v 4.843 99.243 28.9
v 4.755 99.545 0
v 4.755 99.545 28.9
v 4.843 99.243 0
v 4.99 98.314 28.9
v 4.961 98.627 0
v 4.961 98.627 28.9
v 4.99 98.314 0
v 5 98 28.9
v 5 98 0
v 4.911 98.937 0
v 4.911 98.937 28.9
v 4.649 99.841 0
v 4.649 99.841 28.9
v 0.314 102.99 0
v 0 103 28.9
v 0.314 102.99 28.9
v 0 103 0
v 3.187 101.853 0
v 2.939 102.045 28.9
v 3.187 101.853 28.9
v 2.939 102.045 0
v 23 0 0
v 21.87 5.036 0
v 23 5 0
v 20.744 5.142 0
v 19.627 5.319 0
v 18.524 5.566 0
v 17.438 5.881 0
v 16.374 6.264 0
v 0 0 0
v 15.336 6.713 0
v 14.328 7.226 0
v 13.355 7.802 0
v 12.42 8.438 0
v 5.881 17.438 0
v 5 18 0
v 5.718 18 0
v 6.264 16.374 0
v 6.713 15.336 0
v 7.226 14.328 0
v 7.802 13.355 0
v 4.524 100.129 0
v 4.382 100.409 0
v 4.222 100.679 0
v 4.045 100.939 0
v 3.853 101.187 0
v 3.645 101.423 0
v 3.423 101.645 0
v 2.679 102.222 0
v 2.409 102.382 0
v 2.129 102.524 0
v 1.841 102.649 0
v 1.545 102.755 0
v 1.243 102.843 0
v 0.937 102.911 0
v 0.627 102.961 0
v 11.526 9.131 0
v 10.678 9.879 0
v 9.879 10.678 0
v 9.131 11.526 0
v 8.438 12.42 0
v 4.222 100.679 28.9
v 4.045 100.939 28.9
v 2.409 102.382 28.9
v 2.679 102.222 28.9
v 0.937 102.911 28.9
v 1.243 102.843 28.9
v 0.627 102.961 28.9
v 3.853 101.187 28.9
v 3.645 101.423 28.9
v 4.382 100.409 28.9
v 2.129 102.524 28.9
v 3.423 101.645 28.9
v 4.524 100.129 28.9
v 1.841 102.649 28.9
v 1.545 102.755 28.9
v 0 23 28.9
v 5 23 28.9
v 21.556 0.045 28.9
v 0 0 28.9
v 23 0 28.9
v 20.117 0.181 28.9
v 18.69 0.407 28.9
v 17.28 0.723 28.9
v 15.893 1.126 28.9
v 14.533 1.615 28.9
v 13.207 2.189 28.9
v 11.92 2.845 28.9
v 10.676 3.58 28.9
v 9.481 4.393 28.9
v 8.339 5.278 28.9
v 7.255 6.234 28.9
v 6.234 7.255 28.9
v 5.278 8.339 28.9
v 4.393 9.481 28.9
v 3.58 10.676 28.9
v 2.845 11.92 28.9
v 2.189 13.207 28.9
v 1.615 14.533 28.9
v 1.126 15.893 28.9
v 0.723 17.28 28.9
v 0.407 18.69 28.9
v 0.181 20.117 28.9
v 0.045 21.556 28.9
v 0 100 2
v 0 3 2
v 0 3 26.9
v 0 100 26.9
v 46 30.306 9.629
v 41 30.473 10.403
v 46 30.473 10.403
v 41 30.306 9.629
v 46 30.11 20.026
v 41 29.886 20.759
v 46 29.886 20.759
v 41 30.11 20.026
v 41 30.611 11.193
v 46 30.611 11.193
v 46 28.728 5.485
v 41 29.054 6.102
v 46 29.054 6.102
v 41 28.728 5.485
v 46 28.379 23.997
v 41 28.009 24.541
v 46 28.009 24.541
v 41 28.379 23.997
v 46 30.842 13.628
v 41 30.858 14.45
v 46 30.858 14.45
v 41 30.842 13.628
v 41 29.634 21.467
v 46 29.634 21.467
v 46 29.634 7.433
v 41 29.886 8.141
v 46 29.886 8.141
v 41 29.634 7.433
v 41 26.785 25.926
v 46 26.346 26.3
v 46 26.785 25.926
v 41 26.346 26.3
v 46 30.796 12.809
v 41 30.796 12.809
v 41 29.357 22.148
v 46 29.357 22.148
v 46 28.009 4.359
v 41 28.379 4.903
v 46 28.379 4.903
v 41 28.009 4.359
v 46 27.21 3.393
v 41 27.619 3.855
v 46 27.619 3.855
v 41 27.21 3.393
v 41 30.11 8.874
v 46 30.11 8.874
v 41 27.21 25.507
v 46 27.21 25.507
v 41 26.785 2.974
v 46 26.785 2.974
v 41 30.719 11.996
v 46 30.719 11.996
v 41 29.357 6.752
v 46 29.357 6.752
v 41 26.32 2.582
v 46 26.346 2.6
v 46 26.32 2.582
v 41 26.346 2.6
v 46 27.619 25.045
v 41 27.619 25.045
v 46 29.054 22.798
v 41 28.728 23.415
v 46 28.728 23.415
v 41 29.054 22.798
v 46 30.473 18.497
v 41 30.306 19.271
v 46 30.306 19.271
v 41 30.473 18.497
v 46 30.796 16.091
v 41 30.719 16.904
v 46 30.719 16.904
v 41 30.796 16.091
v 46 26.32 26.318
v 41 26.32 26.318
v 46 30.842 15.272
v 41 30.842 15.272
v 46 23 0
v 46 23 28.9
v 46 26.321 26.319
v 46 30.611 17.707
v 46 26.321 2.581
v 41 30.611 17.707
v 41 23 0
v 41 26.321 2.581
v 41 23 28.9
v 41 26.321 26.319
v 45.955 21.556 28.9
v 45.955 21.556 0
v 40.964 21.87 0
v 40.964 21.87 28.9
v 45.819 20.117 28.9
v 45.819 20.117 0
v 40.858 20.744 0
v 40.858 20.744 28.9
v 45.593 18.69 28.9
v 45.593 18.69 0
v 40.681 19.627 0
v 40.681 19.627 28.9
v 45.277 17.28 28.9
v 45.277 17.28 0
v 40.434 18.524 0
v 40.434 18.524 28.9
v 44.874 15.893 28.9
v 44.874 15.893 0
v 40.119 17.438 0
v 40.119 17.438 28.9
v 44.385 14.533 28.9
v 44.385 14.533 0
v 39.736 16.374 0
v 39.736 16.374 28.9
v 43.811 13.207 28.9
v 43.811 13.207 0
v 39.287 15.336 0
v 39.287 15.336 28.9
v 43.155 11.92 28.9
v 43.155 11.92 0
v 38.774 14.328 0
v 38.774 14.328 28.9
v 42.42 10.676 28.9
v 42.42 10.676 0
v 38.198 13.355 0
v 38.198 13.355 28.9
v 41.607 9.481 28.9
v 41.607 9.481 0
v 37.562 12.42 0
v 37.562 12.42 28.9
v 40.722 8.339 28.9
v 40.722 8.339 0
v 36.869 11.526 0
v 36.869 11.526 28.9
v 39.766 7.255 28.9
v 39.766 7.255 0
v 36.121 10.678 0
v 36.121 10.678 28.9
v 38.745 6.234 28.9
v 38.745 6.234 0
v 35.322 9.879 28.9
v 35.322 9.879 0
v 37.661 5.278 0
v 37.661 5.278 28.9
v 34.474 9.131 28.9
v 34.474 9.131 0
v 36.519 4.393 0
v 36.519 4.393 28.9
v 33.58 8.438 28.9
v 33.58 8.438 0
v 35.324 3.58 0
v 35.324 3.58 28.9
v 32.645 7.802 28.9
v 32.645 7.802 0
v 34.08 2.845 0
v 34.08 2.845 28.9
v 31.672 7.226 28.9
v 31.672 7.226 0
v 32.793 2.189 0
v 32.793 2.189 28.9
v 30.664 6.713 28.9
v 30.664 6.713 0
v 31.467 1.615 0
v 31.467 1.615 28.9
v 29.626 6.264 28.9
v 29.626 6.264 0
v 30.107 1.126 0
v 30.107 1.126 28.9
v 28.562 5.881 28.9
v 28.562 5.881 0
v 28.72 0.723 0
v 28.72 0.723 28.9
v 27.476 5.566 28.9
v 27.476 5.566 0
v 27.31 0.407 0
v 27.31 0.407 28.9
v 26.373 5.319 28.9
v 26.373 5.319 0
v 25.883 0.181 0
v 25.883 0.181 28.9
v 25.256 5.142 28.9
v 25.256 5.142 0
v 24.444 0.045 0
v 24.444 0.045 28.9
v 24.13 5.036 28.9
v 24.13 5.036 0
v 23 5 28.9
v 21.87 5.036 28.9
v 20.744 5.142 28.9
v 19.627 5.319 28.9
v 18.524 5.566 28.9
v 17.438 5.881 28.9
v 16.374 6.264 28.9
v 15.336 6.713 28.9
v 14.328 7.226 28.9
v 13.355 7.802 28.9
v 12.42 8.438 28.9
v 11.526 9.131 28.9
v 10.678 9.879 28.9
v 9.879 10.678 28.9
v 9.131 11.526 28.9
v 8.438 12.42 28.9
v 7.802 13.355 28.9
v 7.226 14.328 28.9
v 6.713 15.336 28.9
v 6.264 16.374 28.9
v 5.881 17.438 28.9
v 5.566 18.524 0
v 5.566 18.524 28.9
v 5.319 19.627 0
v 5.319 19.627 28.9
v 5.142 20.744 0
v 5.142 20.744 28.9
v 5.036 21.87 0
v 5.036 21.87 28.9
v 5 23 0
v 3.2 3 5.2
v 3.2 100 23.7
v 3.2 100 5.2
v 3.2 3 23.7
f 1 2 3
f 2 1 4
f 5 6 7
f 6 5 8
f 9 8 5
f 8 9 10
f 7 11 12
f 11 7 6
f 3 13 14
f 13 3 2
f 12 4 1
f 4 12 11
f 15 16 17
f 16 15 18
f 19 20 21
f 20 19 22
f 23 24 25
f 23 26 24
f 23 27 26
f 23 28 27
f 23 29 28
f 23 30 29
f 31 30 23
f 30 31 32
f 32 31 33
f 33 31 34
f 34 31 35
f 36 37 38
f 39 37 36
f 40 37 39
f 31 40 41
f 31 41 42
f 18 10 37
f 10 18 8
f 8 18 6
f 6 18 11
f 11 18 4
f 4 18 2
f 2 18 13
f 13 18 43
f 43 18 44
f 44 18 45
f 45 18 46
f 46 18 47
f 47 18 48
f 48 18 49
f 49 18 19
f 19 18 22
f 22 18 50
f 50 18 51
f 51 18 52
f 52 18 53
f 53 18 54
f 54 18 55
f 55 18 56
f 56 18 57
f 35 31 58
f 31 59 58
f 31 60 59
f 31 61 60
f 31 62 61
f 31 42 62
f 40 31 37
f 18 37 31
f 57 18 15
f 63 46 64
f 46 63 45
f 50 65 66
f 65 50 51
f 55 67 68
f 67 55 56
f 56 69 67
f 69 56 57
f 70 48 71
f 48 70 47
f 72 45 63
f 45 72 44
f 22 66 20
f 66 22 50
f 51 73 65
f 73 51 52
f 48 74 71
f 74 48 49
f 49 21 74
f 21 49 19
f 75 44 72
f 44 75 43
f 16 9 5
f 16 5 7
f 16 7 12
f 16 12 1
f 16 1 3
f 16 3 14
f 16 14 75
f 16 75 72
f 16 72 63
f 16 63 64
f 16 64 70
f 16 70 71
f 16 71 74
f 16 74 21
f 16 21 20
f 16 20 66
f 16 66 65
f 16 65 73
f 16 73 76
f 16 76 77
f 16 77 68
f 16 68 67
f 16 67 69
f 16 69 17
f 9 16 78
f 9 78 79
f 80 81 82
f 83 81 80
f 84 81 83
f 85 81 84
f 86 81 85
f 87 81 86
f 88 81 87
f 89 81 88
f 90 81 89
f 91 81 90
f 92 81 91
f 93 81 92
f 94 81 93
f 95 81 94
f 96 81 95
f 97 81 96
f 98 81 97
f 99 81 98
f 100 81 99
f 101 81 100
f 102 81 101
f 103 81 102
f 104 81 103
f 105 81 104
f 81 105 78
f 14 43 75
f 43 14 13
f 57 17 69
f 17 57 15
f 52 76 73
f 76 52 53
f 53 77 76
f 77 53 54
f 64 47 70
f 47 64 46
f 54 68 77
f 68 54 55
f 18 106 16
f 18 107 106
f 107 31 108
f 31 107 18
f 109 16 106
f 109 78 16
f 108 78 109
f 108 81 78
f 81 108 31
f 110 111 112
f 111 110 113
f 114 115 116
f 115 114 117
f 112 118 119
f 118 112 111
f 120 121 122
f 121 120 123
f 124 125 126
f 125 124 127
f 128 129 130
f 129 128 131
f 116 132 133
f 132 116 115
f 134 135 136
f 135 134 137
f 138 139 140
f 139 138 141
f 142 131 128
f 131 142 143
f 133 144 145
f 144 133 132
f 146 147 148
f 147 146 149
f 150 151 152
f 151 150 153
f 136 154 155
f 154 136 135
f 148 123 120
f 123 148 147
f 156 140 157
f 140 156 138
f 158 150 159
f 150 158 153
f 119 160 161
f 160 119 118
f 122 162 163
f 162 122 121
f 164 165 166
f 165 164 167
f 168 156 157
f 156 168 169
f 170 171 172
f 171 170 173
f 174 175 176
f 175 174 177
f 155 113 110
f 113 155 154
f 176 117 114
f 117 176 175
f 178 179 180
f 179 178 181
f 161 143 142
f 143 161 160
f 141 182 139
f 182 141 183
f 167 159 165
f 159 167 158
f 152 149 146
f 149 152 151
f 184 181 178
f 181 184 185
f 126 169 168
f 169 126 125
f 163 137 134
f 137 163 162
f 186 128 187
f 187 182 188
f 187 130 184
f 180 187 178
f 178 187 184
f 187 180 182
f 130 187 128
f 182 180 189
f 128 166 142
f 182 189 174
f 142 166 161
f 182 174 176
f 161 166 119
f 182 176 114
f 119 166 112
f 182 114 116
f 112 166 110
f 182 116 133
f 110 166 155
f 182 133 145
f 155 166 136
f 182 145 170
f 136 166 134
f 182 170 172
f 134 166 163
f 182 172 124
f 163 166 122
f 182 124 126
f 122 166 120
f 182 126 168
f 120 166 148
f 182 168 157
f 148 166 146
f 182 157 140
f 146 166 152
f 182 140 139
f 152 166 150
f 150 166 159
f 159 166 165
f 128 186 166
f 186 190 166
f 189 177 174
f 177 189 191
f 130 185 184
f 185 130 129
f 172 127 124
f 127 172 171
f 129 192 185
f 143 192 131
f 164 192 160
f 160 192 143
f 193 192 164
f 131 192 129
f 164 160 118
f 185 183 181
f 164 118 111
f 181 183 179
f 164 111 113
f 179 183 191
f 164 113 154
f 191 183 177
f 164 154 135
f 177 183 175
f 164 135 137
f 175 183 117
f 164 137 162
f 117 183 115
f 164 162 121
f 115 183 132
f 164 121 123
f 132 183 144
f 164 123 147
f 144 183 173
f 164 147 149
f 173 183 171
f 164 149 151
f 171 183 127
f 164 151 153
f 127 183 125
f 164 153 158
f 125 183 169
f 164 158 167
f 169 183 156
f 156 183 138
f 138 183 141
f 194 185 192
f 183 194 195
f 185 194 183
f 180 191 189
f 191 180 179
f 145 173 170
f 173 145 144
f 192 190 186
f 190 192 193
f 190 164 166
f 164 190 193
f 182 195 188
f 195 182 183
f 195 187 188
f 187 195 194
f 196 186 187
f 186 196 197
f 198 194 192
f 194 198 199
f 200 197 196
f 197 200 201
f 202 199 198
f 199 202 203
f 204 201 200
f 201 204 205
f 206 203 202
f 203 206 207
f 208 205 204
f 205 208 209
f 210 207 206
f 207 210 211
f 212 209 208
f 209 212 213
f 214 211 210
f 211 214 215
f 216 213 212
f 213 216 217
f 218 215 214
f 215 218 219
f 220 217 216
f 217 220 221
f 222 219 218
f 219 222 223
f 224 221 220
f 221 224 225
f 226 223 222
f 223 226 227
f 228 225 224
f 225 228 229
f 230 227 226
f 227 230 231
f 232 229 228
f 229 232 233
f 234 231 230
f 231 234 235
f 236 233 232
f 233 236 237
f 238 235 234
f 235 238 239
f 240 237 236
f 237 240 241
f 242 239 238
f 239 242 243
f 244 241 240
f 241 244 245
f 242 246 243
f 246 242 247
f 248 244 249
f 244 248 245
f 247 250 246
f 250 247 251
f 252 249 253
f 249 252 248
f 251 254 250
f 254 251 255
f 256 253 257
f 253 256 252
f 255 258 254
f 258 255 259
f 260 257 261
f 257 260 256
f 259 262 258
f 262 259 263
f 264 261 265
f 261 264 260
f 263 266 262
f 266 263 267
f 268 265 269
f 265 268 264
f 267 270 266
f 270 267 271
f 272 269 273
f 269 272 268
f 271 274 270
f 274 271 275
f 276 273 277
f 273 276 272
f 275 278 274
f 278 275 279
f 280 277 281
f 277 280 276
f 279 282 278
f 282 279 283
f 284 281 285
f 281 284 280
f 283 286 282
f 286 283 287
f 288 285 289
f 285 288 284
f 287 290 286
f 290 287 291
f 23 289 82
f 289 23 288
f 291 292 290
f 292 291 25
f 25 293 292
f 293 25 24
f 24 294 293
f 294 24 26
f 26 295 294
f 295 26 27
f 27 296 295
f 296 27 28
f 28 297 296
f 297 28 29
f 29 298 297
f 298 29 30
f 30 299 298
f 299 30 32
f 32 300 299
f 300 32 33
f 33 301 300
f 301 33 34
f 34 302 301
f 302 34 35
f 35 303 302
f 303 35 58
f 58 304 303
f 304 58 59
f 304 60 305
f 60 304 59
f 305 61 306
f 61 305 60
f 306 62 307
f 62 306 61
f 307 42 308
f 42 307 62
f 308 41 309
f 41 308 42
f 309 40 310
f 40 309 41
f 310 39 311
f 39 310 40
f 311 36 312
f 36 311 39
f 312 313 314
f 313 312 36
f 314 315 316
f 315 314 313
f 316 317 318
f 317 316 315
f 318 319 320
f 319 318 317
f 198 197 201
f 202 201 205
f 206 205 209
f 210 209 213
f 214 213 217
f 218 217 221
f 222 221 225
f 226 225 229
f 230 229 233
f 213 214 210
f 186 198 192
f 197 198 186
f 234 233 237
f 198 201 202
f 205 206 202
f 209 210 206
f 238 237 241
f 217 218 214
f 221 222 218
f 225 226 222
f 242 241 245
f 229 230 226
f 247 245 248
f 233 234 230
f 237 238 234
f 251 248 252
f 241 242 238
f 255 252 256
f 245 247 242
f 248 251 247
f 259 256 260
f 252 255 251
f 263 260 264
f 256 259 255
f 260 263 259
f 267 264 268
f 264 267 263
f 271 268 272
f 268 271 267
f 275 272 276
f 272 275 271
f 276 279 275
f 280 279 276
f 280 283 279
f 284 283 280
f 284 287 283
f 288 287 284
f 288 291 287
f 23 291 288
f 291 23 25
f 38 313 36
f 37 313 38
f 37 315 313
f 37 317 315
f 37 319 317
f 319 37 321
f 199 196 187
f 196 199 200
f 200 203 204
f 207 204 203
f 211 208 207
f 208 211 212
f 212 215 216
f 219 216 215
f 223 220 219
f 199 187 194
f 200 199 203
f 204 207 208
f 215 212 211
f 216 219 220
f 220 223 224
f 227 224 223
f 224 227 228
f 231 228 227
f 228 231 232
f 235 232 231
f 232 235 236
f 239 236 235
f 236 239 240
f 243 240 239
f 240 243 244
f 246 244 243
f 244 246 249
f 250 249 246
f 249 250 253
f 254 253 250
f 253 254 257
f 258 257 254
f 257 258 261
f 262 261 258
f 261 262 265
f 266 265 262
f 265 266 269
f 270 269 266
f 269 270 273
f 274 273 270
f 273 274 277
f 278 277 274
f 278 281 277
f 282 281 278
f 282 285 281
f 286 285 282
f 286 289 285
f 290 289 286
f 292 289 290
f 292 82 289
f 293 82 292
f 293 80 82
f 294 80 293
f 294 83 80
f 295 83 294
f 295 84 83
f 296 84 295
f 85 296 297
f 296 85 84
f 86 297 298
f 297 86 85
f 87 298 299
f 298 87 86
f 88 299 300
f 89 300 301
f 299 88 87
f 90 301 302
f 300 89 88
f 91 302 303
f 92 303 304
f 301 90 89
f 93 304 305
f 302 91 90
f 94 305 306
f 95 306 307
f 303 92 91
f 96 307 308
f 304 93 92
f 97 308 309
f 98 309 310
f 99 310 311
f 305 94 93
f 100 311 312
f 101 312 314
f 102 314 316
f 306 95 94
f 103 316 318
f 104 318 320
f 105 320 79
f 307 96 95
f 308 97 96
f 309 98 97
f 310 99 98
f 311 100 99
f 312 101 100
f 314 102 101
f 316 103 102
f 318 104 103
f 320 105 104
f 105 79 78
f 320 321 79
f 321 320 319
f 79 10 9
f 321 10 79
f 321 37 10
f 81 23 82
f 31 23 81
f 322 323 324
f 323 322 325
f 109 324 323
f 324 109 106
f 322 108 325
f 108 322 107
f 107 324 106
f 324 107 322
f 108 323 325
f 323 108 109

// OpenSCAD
/* [Hanging strip dimensions] */
// Width of the hanging strip (mm)
hanging_strip_width = 18.5;
// Height of the hanging strip (mm)
hanging_strip_height = 93;
// Tickness of two pieces of hanging strip attached (mm)
hanging_strip_tickness = 3.2;

/* [Hook parameters] */
// Hook tickness. Should be at higher than the hanging strip thickness. (mm)
hook_tickness = 5; // [2:0.5:10]
// Diameter of the hook (mm)
hook_diameter = 36; // [20:50]
// Major arc angle of the hook (degrees)
hook_angle = 180; // [140:200]

/* [Hidden] */
$fn=100;
// Width of the flat edges on each side of the hanging strip
hook_flat_edge_width = 2;
// Width of the hook on each side of the hanging strip. Flat edge + chamfer.
hook_strip_edge_width = hook_flat_edge_width + sqrt(pow(hanging_strip_tickness, 2));
hook_width = hanging_strip_width + 2 * hook_strip_edge_width;

// Check parameters
assert(hook_tickness > hanging_strip_tickness, "The hook tickeness should be higher than the hanging strip thickness");

base();

module base() {
    hook_radius = hook_diameter/2;

    difference() {
        union() {
            // Base
            cube([hook_tickness,hanging_strip_height+5,hook_width]);

            // Top
            translate([0,hanging_strip_height+5,0]) {
                intersection() {
                    cylinder(r = hook_tickness, h = hook_width);
                    cube([hook_tickness,hook_tickness,hook_width]);
                }
            }

            translate([hook_radius + hook_tickness, hook_radius + hook_tickness,hook_width]) {
                hook(hook_radius);
            }
        }
        
        // Groove for the hanging strip
        translate([0,5,0]) {
            hanging_strip_groove();
        }
    }
}

module hook(hook_radius) {
    #rotate([0,180,hook_angle]) {
        rotate_extrude(angle=hook_angle, convexity=10) {
            translate([hook_radius, 0]) {
                square([hook_tickness,hook_width]);
            }
        }
        rotate([0,0,90]) {
            translate([0,-(hook_tickness+hook_radius),0]) {
                tip();
            }
        }
    }
   
    // Bottom fill
    translate([-(hook_radius),-(hook_radius+hook_tickness),-hook_width]) {
        difference() {
            cube([hook_radius,hook_radius,hook_width]);
            translate([hook_radius,hook_radius+5,0]) {
                cylinder(r = hook_radius, h = hook_width);
            }
        }
    }
    
    // Rounded part at the end of the hook
    module tip() {
        // Tip of hook chamfer angle
        angle = 25;
        cylinder_diam = hook_width*cos(angle);
        
        translate([0,0,hook_width/2]) {
            rotate([270-hook_angle,270,hook_angle]) {
                scale([1,0.6,1]) {
                    difference() {
                        union() {
                            cylinder(d=cylinder_diam, h = hook_tickness);
                            translate([hook_width/2,0,0]) {
                                rotate([0,0,180-angle]) {
                                cube([cylinder_diam/2, tan(angle)*cylinder_diam/2, hook_tickness]);
                                }
                            }
                            translate([-hook_width/2,0,0]) {
                                rotate([0,0,angle-90]) {
                                    cube([tan(angle)*cylinder_diam/2,cylinder_diam/2, hook_tickness]);
                                }

                            }
                        }
                        translate([-hook_width/2, 0, 0]) {
                            cube([hook_width, hook_width/2, hook_tickness]);
                        }
                    }
                }

            }
        }
    }
}

module hanging_strip_groove() {
    groove_width = hook_width - hook_flat_edge_width * 2;
    groove_length = hanging_strip_height + (2 * hook_flat_edge_width);
    translate([0,-hook_flat_edge_width,hook_flat_edge_width]) {
        difference() {
            cube([hanging_strip_tickness,groove_length,groove_width]);
            rotate([0,45,0]) {
                cube([hook_strip_edge_width,groove_length,hook_strip_edge_width]);
            }
            translate([0,0,groove_width]) {
                rotate([0,45,0]) {
                    cube([hook_strip_edge_width,groove_length,hook_strip_edge_width]);
                }
            }
            
        }
    }
}
